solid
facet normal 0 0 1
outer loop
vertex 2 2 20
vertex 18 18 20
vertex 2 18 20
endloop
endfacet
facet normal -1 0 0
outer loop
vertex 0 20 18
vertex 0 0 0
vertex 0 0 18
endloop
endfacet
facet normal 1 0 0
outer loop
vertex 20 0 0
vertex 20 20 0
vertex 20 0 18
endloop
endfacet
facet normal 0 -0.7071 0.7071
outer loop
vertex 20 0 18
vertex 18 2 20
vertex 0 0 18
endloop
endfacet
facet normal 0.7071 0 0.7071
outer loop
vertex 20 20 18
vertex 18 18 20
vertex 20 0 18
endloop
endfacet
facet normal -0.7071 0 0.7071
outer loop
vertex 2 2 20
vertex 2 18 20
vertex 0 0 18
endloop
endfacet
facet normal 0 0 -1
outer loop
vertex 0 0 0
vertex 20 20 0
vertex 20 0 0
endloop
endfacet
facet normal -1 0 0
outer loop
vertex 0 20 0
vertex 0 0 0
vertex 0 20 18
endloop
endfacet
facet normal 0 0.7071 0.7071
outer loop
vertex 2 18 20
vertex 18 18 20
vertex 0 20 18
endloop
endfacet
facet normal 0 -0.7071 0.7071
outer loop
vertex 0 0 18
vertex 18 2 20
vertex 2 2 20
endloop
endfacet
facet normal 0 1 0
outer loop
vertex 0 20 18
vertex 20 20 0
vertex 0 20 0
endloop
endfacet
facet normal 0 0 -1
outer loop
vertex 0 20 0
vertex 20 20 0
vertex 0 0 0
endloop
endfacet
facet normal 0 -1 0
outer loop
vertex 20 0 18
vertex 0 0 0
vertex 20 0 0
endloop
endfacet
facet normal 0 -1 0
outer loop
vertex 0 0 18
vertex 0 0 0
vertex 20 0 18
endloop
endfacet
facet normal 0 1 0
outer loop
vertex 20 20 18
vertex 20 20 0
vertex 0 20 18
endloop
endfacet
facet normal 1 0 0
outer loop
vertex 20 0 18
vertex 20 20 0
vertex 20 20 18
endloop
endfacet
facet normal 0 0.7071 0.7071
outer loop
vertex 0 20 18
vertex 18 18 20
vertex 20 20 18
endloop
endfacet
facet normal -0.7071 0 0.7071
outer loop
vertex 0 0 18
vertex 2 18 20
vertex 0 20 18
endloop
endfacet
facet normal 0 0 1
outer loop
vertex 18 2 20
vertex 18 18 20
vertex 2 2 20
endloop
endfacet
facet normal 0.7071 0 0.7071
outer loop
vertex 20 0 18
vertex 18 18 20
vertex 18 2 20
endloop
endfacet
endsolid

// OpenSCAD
// Calibration cube with chamfered top edges.
size = 20;    // [5:1:100] Edge length in mm
chamfer = 2;  // [0:0.5:5] Top chamfer in mm

hull() {
  cube([size, size, size - chamfer]);
  translate([chamfer, chamfer, 0]) cube([size - 2 * chamfer, size - 2 * chamfer, size]);
}
